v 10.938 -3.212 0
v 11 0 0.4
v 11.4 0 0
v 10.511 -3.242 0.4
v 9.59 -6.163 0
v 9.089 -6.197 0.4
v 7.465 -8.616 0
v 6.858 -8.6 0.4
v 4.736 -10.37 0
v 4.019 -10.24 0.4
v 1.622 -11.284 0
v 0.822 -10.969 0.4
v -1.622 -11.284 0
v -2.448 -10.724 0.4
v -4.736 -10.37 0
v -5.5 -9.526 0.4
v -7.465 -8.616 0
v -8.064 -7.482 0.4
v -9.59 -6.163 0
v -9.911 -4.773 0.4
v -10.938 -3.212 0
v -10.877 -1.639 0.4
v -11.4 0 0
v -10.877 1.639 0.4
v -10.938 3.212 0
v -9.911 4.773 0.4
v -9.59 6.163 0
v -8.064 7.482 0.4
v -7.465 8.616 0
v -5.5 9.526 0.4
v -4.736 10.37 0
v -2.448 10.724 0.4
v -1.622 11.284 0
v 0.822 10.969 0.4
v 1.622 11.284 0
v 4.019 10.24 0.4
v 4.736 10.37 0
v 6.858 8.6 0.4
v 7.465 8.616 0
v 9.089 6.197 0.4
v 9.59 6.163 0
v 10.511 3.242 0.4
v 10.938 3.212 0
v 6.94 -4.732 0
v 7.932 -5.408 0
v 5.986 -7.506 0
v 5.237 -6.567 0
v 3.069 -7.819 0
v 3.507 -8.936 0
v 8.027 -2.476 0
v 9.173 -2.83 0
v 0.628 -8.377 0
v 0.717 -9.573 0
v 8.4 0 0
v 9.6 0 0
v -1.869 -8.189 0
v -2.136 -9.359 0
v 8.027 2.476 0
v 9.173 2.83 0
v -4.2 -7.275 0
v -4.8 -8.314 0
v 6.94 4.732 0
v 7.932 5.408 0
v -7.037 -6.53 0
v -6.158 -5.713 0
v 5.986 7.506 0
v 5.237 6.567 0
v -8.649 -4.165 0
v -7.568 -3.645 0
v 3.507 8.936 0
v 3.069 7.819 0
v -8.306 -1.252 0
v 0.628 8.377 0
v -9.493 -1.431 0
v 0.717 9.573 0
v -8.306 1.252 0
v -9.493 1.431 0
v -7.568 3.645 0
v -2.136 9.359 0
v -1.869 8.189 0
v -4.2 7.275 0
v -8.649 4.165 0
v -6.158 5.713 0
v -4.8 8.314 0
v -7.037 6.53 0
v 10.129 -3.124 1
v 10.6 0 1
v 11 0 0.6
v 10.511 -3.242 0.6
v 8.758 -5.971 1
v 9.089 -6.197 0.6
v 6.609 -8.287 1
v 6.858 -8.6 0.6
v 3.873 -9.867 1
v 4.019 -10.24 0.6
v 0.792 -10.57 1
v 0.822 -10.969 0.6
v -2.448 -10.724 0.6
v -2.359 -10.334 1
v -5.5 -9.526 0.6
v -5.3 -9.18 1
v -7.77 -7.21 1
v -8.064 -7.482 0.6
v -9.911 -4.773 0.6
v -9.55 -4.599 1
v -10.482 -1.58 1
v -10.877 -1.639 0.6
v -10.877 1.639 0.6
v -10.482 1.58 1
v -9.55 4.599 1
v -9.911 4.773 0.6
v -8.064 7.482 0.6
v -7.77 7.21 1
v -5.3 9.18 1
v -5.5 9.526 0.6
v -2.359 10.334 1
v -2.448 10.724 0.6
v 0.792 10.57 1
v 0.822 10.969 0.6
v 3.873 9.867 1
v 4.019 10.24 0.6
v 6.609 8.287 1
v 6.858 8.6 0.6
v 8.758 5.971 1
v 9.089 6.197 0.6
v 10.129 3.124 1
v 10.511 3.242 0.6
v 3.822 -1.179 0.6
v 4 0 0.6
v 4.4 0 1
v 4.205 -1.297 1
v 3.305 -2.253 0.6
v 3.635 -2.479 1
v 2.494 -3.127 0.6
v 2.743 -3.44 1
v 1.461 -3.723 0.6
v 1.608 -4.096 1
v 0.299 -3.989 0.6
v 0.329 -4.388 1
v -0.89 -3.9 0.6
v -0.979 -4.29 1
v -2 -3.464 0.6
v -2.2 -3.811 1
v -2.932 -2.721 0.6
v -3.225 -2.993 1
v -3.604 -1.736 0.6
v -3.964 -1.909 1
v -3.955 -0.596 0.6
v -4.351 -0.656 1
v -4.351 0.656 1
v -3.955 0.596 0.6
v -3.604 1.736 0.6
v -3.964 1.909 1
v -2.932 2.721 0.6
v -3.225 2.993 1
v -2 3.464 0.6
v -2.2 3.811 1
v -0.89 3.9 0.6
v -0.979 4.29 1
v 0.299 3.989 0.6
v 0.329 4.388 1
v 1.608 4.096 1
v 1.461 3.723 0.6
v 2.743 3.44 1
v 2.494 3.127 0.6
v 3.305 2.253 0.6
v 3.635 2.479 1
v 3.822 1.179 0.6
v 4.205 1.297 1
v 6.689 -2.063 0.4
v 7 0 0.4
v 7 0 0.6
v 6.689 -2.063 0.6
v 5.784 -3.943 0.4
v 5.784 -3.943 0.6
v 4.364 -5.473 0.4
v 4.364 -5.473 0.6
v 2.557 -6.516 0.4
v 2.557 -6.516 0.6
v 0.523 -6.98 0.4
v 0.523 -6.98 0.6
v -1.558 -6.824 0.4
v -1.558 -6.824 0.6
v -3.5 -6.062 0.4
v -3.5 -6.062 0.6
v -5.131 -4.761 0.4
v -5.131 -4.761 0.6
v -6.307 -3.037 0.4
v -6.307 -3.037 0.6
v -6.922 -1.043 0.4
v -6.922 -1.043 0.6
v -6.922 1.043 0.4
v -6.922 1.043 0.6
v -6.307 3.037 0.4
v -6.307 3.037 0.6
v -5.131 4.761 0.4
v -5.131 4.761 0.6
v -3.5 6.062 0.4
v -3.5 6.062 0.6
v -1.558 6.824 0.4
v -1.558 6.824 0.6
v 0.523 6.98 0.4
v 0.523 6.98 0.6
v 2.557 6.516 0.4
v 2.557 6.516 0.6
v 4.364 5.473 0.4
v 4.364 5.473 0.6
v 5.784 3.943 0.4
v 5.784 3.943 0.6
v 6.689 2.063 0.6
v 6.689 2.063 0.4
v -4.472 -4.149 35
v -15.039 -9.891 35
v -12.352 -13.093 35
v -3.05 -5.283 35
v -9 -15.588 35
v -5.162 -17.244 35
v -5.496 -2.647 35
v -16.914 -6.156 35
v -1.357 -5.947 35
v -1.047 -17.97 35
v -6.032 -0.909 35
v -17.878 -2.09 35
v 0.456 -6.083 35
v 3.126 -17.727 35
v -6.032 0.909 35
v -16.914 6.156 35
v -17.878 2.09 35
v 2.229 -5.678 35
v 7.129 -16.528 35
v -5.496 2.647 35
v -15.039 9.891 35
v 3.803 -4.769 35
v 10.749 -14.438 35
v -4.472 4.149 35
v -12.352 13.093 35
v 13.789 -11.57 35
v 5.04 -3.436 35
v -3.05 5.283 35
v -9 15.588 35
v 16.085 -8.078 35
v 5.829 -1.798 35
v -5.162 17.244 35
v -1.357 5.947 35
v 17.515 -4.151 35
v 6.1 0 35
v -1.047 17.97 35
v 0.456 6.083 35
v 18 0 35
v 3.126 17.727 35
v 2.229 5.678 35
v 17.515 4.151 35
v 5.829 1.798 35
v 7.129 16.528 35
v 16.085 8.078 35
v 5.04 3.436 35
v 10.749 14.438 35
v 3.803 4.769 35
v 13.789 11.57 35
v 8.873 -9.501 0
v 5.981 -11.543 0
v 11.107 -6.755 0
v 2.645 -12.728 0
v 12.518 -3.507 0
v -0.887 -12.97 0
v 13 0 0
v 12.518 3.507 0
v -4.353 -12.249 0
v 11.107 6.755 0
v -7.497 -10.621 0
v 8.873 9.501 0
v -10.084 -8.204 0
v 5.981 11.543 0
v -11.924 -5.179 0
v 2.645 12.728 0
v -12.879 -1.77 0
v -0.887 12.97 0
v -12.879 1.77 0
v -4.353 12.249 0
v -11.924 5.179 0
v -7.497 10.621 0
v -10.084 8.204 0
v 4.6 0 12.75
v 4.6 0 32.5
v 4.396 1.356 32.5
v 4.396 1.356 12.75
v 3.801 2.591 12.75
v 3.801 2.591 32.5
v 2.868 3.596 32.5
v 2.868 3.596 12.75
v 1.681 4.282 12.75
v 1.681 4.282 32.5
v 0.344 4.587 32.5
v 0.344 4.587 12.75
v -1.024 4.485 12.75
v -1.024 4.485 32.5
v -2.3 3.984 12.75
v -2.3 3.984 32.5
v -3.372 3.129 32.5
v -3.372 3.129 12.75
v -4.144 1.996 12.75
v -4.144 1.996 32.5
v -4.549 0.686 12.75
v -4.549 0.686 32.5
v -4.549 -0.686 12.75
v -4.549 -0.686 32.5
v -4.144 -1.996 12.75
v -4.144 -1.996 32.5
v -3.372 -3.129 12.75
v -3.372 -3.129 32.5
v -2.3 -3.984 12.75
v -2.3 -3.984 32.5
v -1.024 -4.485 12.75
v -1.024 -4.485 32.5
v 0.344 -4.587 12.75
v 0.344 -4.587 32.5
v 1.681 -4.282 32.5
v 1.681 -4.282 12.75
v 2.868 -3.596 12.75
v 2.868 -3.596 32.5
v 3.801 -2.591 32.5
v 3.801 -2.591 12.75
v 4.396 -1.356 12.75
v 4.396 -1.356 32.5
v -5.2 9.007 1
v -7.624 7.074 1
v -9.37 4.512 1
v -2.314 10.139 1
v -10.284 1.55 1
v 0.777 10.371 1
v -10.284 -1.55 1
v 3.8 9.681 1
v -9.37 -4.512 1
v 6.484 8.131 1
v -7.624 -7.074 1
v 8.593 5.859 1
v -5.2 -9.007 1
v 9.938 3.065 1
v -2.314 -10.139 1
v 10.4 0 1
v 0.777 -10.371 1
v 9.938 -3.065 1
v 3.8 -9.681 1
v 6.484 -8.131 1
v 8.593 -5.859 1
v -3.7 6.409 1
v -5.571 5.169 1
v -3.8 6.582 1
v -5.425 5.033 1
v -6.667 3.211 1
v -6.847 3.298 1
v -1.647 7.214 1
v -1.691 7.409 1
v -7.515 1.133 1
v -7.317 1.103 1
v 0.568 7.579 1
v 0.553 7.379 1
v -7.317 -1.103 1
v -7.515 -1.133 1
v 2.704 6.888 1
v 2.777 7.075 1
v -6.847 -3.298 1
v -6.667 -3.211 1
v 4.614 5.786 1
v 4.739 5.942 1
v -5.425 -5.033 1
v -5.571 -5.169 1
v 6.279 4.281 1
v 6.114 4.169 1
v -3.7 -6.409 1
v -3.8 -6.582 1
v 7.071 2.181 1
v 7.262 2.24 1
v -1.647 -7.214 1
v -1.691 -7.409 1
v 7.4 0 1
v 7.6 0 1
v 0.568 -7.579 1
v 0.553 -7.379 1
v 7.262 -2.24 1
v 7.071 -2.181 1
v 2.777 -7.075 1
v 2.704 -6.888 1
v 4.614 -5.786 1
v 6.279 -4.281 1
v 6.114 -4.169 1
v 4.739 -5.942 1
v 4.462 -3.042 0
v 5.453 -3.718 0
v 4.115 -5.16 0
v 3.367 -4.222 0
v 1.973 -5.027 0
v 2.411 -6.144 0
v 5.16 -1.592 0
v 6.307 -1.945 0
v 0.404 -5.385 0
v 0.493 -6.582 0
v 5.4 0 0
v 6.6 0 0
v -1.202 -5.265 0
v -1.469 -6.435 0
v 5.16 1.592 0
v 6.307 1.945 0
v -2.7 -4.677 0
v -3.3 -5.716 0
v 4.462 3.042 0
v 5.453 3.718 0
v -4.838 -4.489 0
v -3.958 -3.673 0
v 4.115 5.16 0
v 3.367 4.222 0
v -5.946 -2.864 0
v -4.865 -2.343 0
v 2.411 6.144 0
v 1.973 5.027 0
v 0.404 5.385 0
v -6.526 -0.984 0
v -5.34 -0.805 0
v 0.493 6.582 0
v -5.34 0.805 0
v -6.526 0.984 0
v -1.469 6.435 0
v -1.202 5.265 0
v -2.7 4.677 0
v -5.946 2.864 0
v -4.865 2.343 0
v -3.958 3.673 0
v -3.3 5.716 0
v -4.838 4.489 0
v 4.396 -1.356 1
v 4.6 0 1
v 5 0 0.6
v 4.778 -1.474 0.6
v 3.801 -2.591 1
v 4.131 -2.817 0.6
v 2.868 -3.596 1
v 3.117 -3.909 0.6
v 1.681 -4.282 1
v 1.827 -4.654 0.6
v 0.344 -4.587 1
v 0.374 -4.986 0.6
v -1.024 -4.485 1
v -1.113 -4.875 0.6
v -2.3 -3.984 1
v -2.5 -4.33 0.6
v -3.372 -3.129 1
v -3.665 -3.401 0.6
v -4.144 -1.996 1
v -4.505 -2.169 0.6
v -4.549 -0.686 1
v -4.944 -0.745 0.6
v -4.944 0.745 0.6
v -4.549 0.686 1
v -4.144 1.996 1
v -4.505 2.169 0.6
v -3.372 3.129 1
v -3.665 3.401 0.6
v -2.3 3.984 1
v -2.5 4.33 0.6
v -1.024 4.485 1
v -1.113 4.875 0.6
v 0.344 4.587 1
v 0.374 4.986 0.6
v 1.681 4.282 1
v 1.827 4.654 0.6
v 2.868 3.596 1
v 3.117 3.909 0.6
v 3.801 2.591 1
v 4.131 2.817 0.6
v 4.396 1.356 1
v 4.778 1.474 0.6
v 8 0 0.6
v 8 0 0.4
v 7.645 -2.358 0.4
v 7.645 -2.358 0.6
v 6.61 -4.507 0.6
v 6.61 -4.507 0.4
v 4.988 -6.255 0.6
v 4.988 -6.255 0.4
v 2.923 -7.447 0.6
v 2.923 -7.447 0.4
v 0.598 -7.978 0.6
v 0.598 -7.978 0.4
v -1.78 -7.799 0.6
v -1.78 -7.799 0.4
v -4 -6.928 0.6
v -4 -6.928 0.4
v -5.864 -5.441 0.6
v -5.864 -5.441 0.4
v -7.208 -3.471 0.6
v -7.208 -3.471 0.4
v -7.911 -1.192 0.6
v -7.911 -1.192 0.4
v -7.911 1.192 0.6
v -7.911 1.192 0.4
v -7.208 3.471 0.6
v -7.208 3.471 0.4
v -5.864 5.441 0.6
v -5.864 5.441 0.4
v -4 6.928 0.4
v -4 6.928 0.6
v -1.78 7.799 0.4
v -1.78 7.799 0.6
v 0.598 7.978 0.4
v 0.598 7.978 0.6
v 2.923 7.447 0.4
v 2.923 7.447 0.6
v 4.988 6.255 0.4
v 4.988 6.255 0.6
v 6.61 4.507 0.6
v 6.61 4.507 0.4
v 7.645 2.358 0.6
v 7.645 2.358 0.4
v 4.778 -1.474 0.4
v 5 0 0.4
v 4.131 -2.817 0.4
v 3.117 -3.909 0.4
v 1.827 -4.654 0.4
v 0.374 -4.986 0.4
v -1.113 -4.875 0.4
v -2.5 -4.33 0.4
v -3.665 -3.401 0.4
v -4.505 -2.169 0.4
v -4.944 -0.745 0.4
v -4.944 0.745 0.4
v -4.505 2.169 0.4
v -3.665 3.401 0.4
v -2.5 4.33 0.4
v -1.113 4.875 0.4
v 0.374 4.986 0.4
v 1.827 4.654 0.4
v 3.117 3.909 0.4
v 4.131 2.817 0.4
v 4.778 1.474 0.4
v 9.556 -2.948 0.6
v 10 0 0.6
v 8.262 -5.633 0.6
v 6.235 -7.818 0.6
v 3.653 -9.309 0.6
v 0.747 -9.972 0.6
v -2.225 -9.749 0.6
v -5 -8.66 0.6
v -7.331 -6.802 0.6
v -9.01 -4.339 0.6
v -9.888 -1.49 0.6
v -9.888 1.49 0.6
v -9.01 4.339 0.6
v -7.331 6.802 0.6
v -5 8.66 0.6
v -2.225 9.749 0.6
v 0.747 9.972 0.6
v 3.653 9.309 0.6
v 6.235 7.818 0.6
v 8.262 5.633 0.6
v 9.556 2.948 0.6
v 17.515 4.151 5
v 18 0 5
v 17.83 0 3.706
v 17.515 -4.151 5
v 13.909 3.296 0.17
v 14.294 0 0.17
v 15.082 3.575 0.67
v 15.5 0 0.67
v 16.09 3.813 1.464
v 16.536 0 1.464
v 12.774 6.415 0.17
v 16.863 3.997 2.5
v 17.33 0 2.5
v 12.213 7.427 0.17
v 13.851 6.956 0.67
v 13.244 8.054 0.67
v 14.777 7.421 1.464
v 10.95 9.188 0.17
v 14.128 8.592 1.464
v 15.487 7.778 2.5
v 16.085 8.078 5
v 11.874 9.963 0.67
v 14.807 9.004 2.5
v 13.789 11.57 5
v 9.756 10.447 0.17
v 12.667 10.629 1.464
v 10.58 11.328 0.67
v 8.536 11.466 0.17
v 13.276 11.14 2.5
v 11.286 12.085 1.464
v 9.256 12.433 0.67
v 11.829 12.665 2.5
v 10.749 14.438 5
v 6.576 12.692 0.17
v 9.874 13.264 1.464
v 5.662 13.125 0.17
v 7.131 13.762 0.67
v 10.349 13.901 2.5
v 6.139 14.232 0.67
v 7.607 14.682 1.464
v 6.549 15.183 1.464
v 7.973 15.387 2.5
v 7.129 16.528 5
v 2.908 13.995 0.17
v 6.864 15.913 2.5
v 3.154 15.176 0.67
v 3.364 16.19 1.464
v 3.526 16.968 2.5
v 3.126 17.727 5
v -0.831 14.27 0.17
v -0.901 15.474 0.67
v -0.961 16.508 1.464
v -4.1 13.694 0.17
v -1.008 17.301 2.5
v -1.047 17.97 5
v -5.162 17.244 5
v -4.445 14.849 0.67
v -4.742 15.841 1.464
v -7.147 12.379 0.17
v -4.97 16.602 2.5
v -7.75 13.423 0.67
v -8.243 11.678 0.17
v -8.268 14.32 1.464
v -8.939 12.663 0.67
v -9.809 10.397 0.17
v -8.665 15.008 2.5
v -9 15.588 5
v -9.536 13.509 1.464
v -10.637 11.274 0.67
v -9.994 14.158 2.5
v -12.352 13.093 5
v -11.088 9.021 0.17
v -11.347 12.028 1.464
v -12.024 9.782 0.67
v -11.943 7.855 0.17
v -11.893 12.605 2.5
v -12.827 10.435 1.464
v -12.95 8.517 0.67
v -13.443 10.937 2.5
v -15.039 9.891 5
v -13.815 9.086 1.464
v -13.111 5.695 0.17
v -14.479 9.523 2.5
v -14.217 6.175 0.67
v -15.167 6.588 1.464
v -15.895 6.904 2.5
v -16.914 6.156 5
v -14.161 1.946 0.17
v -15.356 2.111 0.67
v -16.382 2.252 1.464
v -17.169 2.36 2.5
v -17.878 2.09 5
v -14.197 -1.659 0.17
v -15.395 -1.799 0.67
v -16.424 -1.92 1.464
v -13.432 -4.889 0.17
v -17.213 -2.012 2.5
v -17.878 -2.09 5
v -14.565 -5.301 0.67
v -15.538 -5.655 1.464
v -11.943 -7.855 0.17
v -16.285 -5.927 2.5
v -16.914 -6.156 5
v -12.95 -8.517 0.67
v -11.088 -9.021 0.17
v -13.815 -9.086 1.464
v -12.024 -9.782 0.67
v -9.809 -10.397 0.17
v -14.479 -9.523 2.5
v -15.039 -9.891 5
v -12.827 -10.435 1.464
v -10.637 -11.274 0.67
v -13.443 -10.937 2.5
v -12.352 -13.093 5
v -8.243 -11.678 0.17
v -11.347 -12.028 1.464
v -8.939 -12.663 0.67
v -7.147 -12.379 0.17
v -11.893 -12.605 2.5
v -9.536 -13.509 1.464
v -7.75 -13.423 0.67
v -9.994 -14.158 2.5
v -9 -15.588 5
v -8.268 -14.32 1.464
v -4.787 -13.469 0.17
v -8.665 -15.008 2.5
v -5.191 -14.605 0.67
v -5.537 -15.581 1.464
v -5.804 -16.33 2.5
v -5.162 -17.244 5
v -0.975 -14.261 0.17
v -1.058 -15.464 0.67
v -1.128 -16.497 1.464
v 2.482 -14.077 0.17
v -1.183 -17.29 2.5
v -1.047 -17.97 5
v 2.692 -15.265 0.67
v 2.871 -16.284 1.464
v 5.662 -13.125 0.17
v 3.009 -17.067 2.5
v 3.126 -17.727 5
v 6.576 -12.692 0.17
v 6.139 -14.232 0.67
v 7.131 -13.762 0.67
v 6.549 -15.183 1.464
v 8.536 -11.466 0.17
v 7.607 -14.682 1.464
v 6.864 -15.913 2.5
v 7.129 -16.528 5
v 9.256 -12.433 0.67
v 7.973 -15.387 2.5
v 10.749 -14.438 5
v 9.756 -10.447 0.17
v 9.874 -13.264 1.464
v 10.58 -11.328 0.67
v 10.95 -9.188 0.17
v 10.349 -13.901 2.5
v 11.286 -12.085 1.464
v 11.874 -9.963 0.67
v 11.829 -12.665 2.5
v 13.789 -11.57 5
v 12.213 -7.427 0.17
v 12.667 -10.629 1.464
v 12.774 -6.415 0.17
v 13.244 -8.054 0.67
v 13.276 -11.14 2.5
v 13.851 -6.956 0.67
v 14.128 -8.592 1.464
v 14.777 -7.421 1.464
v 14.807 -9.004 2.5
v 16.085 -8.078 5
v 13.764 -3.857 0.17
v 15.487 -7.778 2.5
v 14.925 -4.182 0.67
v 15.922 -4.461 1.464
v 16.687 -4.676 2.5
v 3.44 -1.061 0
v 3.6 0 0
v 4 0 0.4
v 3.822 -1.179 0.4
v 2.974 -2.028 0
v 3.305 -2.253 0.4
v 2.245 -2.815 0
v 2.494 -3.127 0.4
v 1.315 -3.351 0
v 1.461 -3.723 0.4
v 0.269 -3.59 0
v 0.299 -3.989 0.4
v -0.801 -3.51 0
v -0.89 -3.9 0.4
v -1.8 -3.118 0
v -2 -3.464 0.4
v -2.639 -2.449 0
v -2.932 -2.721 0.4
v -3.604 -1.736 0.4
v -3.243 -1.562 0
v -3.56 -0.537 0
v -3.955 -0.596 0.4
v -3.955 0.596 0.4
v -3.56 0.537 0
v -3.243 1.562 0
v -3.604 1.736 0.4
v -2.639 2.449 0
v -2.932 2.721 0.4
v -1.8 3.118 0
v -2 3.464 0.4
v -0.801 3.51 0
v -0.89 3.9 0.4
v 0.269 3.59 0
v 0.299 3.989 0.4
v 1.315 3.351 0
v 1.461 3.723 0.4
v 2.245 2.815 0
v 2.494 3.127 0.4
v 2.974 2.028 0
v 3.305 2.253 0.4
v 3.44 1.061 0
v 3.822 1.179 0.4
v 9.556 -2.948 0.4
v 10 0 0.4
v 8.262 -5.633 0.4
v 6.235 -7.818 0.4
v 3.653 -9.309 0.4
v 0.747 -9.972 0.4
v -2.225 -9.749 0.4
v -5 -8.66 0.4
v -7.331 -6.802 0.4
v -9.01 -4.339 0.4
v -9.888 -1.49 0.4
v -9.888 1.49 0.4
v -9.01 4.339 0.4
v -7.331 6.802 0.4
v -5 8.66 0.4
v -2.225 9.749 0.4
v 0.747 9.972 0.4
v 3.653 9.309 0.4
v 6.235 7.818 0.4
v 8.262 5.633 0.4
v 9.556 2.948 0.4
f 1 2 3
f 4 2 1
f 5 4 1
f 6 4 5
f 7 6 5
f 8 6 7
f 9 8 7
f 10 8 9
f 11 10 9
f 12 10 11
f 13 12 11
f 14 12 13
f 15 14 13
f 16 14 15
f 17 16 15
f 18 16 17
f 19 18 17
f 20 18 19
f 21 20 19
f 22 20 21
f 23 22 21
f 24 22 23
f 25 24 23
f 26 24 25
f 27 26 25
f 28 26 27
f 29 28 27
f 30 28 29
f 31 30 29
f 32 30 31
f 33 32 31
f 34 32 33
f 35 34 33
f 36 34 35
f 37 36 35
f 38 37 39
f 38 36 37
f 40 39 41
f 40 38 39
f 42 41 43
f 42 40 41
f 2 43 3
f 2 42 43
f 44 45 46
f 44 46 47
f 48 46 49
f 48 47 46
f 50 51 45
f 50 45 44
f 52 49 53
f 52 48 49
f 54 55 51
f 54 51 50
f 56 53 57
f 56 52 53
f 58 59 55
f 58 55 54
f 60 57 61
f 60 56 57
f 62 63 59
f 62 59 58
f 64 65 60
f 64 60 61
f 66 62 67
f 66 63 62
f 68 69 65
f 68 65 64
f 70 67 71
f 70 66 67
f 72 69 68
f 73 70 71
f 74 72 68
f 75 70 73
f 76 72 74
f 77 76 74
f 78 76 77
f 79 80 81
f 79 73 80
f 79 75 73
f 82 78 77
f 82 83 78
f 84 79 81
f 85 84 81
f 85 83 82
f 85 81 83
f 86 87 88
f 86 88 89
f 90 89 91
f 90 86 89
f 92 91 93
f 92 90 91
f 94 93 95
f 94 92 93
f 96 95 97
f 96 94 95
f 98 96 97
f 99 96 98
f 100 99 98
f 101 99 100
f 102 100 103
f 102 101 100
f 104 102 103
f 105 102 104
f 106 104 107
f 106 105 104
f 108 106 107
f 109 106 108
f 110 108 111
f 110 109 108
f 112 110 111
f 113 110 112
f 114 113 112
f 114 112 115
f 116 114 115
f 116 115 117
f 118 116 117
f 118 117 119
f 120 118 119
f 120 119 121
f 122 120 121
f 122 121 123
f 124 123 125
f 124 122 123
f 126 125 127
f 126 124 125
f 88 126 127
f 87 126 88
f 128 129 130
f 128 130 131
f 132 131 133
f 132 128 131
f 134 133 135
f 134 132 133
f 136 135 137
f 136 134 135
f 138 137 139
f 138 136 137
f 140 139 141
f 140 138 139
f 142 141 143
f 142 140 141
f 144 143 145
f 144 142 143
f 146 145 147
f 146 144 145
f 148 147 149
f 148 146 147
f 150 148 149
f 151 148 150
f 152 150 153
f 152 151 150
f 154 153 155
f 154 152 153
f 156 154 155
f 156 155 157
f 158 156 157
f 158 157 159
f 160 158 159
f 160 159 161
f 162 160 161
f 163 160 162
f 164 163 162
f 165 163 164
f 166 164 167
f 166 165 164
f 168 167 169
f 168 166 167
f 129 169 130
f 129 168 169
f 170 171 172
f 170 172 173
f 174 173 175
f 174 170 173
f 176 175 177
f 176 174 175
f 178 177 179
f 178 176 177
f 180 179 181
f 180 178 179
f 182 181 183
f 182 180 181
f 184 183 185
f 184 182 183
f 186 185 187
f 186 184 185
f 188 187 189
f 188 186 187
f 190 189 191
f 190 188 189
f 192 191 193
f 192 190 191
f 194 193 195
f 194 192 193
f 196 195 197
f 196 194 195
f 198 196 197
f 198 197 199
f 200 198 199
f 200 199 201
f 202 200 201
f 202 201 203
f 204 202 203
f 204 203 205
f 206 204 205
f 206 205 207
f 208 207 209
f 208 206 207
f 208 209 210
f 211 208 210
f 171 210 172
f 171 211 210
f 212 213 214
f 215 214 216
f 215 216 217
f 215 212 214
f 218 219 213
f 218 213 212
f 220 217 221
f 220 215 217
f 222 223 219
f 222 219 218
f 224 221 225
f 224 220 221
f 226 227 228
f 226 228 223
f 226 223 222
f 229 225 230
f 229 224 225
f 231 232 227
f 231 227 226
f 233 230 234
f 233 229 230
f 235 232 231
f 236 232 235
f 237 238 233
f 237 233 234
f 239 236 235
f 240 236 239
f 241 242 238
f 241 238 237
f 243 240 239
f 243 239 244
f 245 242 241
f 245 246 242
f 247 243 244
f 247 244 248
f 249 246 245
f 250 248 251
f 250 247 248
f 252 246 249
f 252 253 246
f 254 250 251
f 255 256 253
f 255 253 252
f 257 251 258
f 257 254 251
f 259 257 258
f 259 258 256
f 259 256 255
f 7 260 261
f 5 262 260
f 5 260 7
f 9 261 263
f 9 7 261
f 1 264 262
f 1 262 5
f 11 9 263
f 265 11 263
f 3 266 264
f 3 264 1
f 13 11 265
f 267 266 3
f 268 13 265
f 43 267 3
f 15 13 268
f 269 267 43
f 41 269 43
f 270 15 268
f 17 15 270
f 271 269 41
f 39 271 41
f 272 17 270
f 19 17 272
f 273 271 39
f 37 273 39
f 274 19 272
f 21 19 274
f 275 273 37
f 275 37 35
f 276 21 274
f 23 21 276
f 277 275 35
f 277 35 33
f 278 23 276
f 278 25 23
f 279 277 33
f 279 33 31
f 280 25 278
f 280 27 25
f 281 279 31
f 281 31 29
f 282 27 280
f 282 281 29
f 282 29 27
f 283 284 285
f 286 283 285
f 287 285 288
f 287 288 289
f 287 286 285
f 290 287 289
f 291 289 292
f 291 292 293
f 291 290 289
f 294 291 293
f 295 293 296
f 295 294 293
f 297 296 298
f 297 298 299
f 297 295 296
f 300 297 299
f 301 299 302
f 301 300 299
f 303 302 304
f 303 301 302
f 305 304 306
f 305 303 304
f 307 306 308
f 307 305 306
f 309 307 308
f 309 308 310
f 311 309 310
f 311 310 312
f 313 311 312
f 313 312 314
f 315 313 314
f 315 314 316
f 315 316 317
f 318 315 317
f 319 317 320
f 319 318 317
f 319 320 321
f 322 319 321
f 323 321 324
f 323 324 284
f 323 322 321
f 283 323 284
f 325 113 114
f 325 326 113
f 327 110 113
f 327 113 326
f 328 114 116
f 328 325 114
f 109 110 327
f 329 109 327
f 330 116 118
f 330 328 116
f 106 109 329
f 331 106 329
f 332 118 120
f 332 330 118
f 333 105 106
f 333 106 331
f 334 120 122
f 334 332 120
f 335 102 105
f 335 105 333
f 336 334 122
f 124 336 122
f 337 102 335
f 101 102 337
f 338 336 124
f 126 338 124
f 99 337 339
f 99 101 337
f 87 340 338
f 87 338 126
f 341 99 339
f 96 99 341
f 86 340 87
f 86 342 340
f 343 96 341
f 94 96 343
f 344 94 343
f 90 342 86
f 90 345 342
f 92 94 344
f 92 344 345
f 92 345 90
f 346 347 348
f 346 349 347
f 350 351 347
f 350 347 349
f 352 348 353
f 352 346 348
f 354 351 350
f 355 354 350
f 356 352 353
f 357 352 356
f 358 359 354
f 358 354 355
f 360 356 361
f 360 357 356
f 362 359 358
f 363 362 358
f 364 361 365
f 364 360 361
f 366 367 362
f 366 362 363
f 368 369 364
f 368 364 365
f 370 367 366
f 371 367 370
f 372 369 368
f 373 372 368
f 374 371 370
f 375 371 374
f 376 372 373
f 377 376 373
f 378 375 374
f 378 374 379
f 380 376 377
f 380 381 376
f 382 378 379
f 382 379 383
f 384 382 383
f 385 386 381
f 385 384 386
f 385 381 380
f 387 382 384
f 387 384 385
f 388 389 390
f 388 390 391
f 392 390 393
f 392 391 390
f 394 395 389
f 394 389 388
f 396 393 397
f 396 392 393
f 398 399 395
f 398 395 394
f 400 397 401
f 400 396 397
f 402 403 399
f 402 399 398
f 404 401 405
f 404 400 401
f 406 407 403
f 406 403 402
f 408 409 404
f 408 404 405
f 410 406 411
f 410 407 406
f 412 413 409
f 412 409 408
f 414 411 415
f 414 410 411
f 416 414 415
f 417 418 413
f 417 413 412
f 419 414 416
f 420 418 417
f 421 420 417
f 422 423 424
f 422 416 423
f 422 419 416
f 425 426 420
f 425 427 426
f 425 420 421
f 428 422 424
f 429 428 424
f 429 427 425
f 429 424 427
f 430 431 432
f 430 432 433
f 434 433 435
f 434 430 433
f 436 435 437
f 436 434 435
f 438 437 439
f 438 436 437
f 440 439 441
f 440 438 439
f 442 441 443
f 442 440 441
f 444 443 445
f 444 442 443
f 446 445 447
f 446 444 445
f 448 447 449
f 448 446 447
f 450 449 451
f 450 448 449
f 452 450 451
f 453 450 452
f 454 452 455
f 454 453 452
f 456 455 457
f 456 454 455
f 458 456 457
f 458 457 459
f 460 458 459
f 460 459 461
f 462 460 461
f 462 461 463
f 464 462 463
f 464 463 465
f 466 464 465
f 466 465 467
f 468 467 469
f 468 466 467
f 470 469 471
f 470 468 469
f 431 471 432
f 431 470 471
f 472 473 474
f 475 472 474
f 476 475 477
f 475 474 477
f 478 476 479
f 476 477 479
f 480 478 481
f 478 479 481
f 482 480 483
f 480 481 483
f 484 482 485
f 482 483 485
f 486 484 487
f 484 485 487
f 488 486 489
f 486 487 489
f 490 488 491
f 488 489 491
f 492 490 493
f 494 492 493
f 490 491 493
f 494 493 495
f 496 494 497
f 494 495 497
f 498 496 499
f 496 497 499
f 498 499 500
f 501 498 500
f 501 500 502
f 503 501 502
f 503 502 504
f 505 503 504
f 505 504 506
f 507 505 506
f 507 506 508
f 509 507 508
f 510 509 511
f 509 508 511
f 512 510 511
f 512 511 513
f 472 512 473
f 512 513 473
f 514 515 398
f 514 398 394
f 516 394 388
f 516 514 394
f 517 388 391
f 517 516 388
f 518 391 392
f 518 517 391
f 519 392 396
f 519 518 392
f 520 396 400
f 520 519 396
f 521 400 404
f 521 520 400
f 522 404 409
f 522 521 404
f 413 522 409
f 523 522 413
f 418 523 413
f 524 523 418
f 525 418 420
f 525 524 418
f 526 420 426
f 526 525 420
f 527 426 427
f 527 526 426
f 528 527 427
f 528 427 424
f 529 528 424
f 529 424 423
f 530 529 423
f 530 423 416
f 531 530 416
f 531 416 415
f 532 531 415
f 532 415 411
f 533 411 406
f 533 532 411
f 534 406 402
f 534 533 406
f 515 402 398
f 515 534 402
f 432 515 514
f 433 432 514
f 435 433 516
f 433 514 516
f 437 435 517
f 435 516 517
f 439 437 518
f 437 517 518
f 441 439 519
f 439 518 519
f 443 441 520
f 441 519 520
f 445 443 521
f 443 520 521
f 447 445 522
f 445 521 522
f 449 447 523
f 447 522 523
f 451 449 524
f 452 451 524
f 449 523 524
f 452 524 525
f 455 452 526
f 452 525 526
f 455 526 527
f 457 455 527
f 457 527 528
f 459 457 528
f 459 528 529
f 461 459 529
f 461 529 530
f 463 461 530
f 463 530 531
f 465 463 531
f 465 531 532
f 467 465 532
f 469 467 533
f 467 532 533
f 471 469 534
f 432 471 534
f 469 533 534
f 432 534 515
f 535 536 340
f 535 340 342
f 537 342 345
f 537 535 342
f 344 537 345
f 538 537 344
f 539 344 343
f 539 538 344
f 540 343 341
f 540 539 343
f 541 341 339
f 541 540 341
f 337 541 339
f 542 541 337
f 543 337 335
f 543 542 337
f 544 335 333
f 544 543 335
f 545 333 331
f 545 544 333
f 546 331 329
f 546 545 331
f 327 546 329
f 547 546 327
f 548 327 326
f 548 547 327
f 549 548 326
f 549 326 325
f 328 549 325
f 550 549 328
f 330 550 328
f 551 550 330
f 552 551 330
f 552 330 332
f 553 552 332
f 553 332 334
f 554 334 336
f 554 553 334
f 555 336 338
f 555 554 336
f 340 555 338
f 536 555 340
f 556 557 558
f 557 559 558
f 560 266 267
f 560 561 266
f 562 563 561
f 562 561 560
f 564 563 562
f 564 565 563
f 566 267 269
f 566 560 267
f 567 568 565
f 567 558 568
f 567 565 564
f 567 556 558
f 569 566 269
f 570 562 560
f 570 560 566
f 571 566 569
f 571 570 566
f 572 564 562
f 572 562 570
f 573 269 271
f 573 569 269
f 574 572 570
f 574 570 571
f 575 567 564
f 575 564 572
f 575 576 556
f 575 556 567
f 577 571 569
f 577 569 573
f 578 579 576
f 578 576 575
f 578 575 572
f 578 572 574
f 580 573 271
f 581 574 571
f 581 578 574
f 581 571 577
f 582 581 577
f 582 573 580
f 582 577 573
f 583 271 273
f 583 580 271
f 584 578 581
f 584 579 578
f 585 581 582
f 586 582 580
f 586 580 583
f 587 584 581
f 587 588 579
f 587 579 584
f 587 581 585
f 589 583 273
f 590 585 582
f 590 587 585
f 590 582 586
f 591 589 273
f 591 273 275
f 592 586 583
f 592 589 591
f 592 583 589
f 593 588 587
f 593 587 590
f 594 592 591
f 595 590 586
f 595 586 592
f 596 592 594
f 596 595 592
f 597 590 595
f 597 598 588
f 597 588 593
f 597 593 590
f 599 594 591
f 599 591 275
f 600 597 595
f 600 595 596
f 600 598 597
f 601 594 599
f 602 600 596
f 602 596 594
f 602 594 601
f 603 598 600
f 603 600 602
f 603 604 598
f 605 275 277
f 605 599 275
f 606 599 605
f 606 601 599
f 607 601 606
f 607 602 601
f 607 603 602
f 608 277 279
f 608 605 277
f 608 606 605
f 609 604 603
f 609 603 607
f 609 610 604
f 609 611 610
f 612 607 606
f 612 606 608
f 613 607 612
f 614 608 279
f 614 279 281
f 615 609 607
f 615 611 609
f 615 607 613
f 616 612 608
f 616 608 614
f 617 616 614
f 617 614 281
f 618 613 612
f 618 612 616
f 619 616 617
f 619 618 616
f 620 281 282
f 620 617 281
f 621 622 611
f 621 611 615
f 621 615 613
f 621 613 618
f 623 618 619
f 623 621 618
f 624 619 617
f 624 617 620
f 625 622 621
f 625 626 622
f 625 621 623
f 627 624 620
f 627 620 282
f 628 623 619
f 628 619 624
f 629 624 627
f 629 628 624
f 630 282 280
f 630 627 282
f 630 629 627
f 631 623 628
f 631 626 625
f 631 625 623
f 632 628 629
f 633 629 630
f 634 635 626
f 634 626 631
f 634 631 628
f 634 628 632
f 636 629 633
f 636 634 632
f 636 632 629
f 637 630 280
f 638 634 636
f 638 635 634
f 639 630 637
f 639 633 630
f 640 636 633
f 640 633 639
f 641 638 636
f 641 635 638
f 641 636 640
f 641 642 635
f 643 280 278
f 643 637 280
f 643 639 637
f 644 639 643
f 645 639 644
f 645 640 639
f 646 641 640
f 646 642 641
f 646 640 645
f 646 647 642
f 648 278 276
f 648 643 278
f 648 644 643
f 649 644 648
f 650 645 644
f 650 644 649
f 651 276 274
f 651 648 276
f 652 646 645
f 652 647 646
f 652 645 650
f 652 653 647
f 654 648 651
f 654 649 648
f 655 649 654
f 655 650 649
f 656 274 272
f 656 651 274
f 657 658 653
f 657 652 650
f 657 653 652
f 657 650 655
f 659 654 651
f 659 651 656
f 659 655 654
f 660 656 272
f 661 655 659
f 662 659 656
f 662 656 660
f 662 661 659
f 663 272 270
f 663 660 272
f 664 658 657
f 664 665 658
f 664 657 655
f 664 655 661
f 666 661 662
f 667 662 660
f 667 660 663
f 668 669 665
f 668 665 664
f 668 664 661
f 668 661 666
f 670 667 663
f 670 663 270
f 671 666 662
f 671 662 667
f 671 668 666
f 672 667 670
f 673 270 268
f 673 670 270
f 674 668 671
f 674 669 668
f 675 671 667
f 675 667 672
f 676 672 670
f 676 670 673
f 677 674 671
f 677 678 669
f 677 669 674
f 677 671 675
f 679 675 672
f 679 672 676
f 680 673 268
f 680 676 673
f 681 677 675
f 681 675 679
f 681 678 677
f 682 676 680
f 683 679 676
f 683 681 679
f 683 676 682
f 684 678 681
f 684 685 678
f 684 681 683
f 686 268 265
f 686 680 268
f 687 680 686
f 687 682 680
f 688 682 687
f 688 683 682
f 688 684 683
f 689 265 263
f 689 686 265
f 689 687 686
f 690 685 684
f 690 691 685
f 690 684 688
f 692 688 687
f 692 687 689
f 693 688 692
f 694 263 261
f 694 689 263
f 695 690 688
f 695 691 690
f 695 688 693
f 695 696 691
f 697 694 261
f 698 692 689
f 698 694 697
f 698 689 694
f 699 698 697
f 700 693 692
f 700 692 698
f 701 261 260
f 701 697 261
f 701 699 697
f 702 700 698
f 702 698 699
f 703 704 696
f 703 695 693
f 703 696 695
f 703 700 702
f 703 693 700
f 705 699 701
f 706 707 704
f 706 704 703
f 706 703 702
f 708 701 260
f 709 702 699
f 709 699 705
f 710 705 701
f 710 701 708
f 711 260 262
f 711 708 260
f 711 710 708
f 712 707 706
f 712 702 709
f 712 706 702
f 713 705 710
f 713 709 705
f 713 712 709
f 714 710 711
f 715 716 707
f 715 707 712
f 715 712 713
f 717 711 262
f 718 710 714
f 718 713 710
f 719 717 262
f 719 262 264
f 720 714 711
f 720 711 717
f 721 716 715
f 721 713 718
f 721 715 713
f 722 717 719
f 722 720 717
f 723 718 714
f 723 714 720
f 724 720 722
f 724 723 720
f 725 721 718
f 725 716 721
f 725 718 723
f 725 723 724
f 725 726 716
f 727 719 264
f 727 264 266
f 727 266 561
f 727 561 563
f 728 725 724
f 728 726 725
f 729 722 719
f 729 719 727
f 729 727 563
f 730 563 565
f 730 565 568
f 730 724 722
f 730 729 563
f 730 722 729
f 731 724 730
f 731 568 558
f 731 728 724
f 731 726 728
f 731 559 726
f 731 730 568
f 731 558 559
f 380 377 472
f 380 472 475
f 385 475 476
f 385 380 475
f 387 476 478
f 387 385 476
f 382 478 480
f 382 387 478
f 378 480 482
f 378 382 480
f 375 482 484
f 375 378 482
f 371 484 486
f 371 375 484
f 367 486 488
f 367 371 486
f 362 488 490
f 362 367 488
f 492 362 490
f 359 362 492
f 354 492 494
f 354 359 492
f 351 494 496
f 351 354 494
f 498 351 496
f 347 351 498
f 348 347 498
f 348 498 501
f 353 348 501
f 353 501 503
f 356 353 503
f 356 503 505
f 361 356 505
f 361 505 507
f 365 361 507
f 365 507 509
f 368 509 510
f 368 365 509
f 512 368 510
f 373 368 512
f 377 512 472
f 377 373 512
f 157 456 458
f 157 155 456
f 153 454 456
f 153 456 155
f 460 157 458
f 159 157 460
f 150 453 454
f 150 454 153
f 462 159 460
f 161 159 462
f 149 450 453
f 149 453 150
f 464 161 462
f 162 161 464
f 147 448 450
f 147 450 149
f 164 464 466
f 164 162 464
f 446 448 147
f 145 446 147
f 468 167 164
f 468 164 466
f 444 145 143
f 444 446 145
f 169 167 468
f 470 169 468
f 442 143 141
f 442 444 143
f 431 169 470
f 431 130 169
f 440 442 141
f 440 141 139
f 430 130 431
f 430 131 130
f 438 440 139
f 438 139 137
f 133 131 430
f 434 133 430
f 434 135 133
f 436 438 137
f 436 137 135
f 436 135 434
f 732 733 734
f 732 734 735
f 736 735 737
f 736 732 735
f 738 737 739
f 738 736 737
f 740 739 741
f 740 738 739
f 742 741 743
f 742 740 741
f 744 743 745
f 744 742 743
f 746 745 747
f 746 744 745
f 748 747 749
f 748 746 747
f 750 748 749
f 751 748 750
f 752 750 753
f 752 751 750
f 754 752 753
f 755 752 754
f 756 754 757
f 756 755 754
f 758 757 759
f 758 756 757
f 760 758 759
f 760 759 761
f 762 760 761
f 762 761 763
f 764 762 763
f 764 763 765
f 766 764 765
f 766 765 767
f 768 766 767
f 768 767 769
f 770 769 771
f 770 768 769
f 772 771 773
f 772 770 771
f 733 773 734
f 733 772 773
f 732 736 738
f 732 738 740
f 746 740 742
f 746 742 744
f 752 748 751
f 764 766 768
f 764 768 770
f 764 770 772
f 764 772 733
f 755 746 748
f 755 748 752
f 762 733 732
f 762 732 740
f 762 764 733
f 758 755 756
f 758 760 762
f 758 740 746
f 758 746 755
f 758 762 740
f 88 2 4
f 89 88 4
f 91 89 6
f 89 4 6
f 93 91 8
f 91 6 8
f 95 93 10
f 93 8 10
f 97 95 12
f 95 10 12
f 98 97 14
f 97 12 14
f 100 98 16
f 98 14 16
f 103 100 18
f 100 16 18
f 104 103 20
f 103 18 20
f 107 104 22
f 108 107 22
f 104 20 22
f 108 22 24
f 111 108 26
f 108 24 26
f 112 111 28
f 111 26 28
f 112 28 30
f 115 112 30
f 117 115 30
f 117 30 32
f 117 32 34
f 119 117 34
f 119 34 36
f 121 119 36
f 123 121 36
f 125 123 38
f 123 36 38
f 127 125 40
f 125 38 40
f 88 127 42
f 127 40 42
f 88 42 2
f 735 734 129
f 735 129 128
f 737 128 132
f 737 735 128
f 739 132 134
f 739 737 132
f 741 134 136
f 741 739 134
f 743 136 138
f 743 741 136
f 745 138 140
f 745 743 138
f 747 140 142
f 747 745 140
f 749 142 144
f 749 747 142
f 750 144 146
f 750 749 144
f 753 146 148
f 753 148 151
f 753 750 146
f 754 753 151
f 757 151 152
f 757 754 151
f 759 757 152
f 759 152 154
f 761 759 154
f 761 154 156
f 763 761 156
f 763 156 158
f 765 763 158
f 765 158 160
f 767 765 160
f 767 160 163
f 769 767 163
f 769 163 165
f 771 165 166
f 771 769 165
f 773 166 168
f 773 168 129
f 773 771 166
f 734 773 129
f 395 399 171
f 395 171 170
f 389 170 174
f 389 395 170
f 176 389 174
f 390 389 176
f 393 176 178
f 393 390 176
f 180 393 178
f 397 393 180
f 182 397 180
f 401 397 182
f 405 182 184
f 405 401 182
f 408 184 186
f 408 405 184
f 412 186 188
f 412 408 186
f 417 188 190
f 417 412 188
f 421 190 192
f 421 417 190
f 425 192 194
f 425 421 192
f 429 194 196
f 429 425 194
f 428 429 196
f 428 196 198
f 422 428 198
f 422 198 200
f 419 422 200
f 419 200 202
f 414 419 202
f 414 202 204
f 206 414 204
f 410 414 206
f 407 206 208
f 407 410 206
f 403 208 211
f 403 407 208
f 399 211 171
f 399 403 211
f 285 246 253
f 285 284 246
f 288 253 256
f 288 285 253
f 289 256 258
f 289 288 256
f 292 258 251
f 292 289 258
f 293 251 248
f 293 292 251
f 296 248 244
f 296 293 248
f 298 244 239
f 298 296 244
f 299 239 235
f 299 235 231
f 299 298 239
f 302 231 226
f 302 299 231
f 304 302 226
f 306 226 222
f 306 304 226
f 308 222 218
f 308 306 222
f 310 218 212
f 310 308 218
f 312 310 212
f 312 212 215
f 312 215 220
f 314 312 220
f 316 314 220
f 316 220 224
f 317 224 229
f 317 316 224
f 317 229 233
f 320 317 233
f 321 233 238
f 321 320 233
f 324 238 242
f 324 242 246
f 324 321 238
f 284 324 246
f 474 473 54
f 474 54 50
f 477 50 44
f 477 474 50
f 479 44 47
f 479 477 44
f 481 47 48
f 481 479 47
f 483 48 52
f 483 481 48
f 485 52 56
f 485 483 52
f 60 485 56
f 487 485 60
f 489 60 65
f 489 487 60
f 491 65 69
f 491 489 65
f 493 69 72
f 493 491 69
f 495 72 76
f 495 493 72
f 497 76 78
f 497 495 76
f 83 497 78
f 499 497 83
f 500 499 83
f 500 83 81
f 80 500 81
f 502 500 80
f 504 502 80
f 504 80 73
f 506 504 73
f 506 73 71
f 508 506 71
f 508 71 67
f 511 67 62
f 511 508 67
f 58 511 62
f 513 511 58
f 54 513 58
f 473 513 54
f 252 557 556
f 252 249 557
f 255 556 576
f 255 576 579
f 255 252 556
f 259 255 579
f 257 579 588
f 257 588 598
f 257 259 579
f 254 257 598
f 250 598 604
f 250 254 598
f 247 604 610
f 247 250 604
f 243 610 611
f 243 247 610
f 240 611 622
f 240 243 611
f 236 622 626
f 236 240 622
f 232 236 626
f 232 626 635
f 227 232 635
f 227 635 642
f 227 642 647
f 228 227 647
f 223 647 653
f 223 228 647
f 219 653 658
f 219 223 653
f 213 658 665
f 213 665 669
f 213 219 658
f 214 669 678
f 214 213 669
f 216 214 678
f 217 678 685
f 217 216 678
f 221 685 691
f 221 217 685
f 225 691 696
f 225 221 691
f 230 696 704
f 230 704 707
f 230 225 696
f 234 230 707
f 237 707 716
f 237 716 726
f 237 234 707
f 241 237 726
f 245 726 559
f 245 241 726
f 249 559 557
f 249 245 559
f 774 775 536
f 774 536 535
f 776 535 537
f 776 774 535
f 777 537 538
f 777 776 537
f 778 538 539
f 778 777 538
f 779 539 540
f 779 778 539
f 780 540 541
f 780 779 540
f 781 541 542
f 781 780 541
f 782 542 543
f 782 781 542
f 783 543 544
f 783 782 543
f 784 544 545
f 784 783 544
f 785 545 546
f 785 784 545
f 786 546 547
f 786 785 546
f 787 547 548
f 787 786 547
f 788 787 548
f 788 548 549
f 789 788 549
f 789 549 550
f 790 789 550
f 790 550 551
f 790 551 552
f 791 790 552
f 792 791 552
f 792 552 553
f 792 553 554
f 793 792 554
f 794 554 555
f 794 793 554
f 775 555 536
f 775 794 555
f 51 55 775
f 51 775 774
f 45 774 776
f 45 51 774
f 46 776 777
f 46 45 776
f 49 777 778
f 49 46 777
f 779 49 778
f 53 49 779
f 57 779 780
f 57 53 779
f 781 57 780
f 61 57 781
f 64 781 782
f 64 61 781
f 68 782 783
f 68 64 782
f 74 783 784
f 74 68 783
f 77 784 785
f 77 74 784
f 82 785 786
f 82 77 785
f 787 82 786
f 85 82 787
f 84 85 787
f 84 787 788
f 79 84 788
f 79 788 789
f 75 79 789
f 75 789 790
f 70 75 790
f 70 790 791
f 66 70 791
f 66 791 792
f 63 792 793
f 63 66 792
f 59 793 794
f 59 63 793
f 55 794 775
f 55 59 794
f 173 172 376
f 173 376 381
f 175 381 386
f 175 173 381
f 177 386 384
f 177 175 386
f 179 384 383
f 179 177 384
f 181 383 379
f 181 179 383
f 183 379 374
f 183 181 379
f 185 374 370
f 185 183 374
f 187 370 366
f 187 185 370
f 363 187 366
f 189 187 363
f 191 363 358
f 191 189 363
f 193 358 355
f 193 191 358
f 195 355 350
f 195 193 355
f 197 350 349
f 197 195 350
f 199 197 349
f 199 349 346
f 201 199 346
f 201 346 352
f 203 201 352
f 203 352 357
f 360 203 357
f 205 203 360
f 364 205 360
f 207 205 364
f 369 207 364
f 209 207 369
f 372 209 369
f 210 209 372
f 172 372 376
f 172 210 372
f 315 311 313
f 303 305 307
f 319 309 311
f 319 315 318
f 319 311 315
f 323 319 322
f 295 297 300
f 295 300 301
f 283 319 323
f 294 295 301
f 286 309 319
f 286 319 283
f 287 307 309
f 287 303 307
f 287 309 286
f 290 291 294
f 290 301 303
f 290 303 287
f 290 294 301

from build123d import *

# Parameters (mm, degrees)
F2_R     = 11
F2_R_2   = 10
F2_R_3   = 8
F2_R_4   = 7
F2_R_5   = 5
F2_R_6   = 4
F3_DEPTH = 1
F4_SIZE  = 0.4
F5_SIZE  = 0.4


with BuildPart() as f1:
    # F0 (on Front) → F1 (revolve)
    with BuildSketch(Plane.XZ):
        with BuildLine():
            Line((0, 12.75), (0, 0))
            Line((0, 0), (13, 0))
            ThreePointArc((13, 0), (16.535534, 1.464466), (18, 5))
            Line((18, 5), (18, 35))
            Line((18, 35), (6.1, 35))
            Line((6.1, 35), (4.6, 32.5))
            Line((4.6, 32.5), (4.6, 12.75))
            Line((4.6, 12.75), (0, 12.75))
        make_face()
    revolve(axis=Axis((0, 0, 24.334948), (0, 0, 1)))

    # F2 (on face) → F3 (cut)
    with BuildSketch(Plane(origin=(0, 0, 0), x_dir=(1, 0, 0), z_dir=(0, 0, -1))):
        Circle(F2_R)
        Circle(F2_R_2, mode=Mode.SUBTRACT)
        Circle(F2_R_3)
        Circle(F2_R_4, mode=Mode.SUBTRACT)
        Circle(F2_R_5)
        Circle(F2_R_6, mode=Mode.SUBTRACT)
    extrude(amount=-F3_DEPTH, mode=Mode.SUBTRACT)

    # F4
    f4_edges = [f1.edges().sort_by_distance(p)[0] for p in [
        (-11, 0, 0),
        (-10, 0, 0),
        (-8, 0, 0),
        (-7, 0, 0),
        (-5, 0, 0),
        (-4, 0, 0),
    ]]
    chamfer(f4_edges, length=F4_SIZE)

    # F5
    f5_edges = [f1.edges().sort_by_distance(p)[0] for p in [
        (-11, 0, 1),
        (-10, 0, 1),
        (-8, 0, 1),
        (-7, 0, 1),
        (-5, 0, 1),
        (-4, 0, 1),
    ]]
    chamfer(f5_edges, length=F5_SIZE)


solid = f1.part
